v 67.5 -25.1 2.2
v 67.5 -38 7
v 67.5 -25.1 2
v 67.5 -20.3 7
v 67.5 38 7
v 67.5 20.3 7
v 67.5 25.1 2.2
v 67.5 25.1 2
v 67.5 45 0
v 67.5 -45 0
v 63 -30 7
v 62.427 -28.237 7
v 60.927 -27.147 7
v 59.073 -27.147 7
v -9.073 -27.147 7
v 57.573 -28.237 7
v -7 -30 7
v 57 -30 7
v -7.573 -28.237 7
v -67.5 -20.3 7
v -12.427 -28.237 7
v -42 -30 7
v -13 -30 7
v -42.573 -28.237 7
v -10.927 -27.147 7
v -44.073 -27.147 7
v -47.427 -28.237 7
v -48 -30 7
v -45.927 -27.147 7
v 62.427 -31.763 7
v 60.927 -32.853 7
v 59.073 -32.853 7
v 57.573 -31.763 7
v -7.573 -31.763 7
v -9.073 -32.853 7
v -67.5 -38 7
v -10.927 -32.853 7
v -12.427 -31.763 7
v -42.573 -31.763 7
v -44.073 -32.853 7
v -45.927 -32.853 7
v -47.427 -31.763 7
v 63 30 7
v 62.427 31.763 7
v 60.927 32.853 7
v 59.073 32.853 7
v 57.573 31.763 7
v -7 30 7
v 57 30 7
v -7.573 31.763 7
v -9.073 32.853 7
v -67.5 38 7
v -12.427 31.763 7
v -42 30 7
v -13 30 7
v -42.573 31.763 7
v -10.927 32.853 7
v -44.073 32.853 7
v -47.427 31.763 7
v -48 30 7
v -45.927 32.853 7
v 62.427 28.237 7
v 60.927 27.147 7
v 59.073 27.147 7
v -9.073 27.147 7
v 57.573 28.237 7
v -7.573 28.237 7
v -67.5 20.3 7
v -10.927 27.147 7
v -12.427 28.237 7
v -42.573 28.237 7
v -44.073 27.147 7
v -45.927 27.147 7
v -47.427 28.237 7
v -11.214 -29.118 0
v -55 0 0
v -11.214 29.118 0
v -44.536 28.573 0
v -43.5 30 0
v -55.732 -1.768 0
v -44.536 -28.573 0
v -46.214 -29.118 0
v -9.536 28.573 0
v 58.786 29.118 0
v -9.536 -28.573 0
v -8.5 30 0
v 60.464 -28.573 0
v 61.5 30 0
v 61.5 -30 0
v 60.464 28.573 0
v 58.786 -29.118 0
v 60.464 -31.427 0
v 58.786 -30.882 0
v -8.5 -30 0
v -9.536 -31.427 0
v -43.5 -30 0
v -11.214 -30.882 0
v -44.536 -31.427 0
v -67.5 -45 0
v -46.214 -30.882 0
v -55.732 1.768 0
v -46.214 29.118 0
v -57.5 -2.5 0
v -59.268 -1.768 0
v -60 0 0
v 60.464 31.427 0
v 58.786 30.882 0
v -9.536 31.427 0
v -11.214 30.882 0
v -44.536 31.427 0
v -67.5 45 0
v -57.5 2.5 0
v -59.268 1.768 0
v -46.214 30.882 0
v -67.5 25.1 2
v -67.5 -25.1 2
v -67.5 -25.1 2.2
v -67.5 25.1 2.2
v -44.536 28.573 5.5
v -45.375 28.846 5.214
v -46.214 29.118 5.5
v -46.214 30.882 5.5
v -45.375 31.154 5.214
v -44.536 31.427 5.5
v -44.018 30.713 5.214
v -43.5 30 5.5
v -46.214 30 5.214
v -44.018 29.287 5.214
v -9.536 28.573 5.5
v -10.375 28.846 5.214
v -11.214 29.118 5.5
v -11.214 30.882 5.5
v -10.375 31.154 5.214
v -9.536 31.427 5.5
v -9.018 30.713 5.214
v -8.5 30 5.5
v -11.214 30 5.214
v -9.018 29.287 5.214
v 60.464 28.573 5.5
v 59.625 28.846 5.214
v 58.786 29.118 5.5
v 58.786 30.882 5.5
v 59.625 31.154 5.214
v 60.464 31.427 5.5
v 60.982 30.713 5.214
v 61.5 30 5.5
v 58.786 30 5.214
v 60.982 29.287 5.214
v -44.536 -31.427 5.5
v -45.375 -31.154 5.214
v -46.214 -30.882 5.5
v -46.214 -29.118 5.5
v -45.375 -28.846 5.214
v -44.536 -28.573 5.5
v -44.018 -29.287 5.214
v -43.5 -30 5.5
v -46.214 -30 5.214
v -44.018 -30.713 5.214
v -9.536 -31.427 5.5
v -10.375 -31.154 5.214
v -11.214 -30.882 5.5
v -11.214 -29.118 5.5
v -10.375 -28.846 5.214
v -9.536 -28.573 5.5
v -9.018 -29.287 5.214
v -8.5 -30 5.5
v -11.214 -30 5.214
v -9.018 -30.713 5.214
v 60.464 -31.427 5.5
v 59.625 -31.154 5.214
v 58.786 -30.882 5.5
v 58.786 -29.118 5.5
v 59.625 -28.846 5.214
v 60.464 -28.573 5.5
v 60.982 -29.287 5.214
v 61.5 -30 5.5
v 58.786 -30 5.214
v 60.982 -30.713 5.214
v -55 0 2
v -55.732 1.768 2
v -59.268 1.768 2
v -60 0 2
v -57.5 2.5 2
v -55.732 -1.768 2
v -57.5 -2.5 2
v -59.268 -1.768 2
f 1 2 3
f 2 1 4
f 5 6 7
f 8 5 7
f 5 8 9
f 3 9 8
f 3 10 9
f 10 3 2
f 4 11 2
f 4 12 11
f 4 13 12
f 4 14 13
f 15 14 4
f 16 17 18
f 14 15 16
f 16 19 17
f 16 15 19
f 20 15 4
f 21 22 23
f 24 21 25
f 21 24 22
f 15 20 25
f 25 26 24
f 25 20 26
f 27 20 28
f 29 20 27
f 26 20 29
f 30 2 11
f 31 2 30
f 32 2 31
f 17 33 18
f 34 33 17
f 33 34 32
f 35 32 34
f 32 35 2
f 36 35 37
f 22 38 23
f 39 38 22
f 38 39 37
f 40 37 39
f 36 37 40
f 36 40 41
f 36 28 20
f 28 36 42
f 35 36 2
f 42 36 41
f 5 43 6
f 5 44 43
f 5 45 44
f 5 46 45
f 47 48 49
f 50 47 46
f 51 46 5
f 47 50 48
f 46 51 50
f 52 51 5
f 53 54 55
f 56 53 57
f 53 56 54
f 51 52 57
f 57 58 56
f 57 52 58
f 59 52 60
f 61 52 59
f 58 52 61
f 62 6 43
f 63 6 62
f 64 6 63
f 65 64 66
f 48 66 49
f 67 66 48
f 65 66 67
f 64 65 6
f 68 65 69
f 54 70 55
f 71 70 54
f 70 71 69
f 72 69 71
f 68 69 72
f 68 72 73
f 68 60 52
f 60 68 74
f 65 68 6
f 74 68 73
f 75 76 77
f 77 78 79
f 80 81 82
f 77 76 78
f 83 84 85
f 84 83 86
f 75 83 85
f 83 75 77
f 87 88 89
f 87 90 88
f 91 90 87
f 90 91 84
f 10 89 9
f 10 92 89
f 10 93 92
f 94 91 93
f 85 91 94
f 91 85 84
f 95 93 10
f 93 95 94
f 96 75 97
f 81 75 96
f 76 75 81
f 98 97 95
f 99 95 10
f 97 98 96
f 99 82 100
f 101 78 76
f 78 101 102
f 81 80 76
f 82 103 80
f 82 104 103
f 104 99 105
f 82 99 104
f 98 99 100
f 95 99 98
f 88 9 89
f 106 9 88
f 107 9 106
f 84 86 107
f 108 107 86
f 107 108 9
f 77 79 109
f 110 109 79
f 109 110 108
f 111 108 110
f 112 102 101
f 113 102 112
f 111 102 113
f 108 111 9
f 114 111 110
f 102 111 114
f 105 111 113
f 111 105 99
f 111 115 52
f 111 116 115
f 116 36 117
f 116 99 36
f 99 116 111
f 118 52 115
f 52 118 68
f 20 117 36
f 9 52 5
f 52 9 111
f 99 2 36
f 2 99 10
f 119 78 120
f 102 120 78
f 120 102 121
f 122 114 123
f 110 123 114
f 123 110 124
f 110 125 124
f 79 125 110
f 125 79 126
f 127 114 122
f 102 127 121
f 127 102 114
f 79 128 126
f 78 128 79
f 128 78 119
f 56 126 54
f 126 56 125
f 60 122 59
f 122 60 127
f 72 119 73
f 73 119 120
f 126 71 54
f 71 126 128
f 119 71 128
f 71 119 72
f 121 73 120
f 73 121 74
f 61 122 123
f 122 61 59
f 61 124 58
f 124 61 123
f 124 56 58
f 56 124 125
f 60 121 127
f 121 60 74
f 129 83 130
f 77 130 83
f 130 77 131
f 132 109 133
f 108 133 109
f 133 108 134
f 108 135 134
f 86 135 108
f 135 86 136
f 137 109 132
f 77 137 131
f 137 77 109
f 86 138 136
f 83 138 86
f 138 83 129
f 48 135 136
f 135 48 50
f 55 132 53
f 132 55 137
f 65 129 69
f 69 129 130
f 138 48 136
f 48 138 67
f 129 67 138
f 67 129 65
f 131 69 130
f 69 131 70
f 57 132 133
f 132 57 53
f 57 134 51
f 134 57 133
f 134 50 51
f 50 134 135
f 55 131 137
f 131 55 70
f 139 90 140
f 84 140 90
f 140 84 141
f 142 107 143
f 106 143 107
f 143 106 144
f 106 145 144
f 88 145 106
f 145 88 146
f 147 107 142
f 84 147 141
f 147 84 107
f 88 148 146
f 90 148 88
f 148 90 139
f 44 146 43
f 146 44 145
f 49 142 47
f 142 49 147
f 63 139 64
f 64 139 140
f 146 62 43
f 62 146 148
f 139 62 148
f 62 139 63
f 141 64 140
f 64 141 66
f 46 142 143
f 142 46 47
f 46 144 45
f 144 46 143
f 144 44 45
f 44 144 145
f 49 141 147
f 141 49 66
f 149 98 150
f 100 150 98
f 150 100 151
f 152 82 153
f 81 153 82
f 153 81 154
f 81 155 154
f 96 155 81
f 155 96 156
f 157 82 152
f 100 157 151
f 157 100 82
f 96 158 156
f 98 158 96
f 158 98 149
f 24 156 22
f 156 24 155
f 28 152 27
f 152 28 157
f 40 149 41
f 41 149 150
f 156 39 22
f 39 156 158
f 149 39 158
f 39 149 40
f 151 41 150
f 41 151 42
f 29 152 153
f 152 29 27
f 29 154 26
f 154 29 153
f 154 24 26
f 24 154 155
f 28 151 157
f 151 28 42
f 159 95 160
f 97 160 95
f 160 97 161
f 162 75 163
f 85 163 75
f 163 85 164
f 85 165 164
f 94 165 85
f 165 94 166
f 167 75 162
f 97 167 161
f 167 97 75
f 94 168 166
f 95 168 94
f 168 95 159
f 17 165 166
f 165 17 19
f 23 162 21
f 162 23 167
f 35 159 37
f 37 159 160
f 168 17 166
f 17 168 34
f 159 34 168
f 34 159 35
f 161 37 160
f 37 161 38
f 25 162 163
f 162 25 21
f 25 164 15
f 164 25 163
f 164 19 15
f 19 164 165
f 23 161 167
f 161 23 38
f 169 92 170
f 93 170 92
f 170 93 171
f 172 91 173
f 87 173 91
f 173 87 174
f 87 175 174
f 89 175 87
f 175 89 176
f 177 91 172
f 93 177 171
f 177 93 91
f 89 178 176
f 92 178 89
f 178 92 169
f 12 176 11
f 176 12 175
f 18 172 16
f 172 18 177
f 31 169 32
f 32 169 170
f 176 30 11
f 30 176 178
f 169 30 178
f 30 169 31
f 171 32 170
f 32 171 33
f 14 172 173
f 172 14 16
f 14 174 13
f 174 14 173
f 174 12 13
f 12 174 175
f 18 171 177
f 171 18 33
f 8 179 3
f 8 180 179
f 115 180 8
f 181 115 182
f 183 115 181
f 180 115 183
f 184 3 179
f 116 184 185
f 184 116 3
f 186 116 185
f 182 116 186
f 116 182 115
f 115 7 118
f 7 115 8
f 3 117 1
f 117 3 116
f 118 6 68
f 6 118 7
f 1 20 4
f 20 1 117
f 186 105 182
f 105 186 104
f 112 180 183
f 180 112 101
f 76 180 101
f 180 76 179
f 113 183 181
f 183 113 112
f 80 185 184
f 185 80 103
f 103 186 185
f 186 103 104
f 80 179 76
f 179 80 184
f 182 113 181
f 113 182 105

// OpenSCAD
// file: config_4x5.scad
/*
This is the base configuration file for the 4x5" format
# we are not using the exact ANSI measures, but slightly rounded measures for slight simplification
*/
vStabilizerTotal_h = 7;

// general tolerance
vTolerance = 0.2;

// sheet film and cassette measurements (roughly based on the ANSI measurements)
vFilmSheet_l = 127;
vFilmSheet_w = 102;
vCassette_l = 160; // A min
vCassette_w = 121; // B max
vCassette_h = 13.2; // C max
vLightTrap_l = 2; // M2
vLightTrap_w = vCassette_w;
vLightTrap_h = 1.5; // M1
vLightTrap_offsetX = 141; // G max
vFilmWindow_l = 121;
vFilmWindow_w = 101;
vFilmWindow_offsetX = 16;
vGroundGlass_offsetZ = 5;

// Graflok
vGraflok_h = 6; // this is not the official measurement, just measured from a camera 

// lens board measures (we are using Wista/Technika-style lensboards)
vLensboard_l = 100;
vLensboard_w = 97;
vLensboard_h = 2;
vLensboard_offsetX = -(vLensboard_l+3)/2; // caution: we have an asymetric offset!
vLensboard_offsetY = -vLensboard_w/2;
vLensboardHole_d = 85;
vLensboardLighttrap_d = 89;
vLensboardLighttrap_h = 1+vTolerance;

// bellows frame measures - the bellows frame design is derived from standardcameras.com
// back frame
vBellowsBackInner_l = 144; //???? check and replace with the measurement from your bellows!
vBellowsBackInner_w = vBellowsBackInner_l;
vBellowsBackOuter_l = vBellowsBackInner_l+1;
vBellowsBackOuter_w = vBellowsBackOuter_l;

vBellowsBackFrameOuter_l = 159;
vBellowsBackFrameOuter_w = vBellowsBackFrameOuter_l;
vBellowsBackFrameOuter_h = 7;
vBellowsBackFrameInner_l = 135;
vBellowsBackFrameInner_w = vBellowsBackFrameInner_l;
vBellowsBackFrameInner_h = 5;

vBellowsBackLightTrapOuter_l = vBellowsBackFrameInner_l+2*2;
vBellowsBackLightTrapOuter_w = vBellowsBackLightTrapOuter_l;
vBellowsBackLightTrap_h = 3;

//vBellowsBackFrameScrewHole_d = 2;
//vBellowsBackFrameScrewHole_h = 10;
vBellowsBackFrameScrewHole_offsetXY = 70;
vBellowsBackFrameScrewHole_offsetZ = vBellowsBackFrameOuter_h/2;

// front frame
vBellowsFrontInner_l = 94; //???? check and replace with the measurement from your bellows!
vBellowsFrontInner_w = vBellowsFrontInner_l;
vBellowsFrontOuter_l = vBellowsFrontInner_l+1;
vBellowsFrontOuter_w = vBellowsFrontOuter_l;

vBellowsFrontFrameOuter_l = 104;
vBellowsFrontFrameOuter_w = vBellowsFrontFrameOuter_l;
vBellowsFrontFrameOuter_h = 7;
vBellowsFrontFrameInner_l = 82;
vBellowsFrontFrameInner_w = vBellowsFrontFrameInner_l;
vBellowsFrontFrameInner_h = 5;

vBellowsFrontLightTrapOuter_l = vBellowsFrontFrameInner_l+2*2;
vBellowsFrontLightTrapOuter_w = vBellowsFrontLightTrapOuter_l;
vBellowsFrontLightTrap_h = 0;

//vBellowsFrontFrameScrewHole_d = 2;
//vBellowsFrontFrameScrewHole_h = 10;
vBellowsFrontFrameScrewHole_offsetXY = 40;
vBellowsFrontFrameScrewHole_offsetZ = vBellowsFrontFrameOuter_h/2;

// body dimensions
vWall_strength = 5;
vBodyOuter_l = 185; // make sure this is at least 4*vWall_strength larger than vBellowsBackFrameOuter_l!
vBodyOuter_w = 170; // make sure this is at least 2*vWall_strength larger than vBellowsBackFrameOuter_l!
vBodyOuter_h = 65;
vBodyEdge_r = vWall_strength;

// we will center our model on the Y axis and on the center of the bellows frame
// at least for the 4x5 version, we have to do an asymetric offset of 2.5mm on the X-axis 
vAsymOffsetX = -2.5;  

// back plate
vBackPlateLength = 160; // we will probably use about the same size as the bellows back frame
vBackPlateStrength = vWall_strength;

// hinges for front lid
vHingeInnerDistance = 100;
vHingeBaseWidth = 20;
vHingeHole = 4;

// lid lock measures
vLidLockBase_d = 8;
vLidLockHole_distance = 70;

// rail dimensions
vLowerRail_w = 90;
vUpperRail_w = vLowerRail_w;

// cutout for stop indents
vStopIndent_l = 4;
vStopIndent_h = 5;
vStopIndentDistance = 25; // shorter than 25 is not necessary
vStopIndent_offsetX = 20; // don't go shorter than 20 if you intend to use a 90mm lens!

// for all dovetails we use a base width of 5mm and a base height of 5mm
// we are applying tolerances to the inner AND outer part of a dovetail, in width and height
vDoveTail_w = 5;
vDoveTail_h = 5;
vDoveTail_tolerance = 0.2;

// front standard carrier / slider
// width is depending on vUpperRail_w
vSliderBase_w = vUpperRail_w + (4*vDoveTail_w);
vSliderBase_l = 40; // make sure to have enough space in the body.


// lever plate 
vLeverPlateBase_w = vUpperRail_w - (8*vDoveTail_w);
vLeverPlateBlock_w = 25;
vLeverPlateBlock_l = vSliderBase_l-(2*vDoveTail_w);

vFrontStandard_h = 126;
vFrontStandardSlot_h = vFrontStandard_h - 30;

// lensboard carrier
vFrontPlate_length = vSliderBase_w+6; // vSliderBase_w is a bit too tight for 4x5", so there we will add 5mm, for 5x7 vSliderBase_w is OK to get a squared lensboard carrier
vFrontPlate_width = vSliderBase_w; //vFrontPlate_length;
vFrontPlate_height = 16;
vEdgeCutCylinder = floor(sqrt(2*pow(vFrontPlate_width,2)))-5;

vTiltDovetailBase_d1 = 30;
vTiltDovetailBase_d2 = vTiltDovetailBase_d1+(2*vDoveTail_w);
vTiltDovetailBaseBlock_d = vTiltDovetailBase_d1+(4*vDoveTail_w);

vTiltDovetail_d1 = vTiltDovetailBase_d1-vTolerance;
vTiltDovetail_d2 = vTiltDovetailBase_d2-vTolerance;
vTiltDovetail_h = vDoveTail_w-vTolerance;

vTiltDovetailCutout_d1 = vTiltDovetailBase_d2+vTolerance;
vTiltDovetailCutout_d2 = vTiltDovetailBase_d1+vTolerance;

vAxisHole_d = 10+vTolerance;
vAxisHole_h = vDoveTail_w+vTolerance;

vTiltLockBolt_d = 12;
vTiltLockBolt_h = 14;
//vTiltLockBoltHole_d = 8;
//vTiltLockBoltHole_h = vTiltLockBolt_h;

vTiltHeight = 50;
vTiltRadius = vFrontPlate_length/2;
vTiltAngleMinus = -7;
vTiltAnglePlus = 7;
vTiltAxis_d = 10-vTolerance;

// focusing rod
vFocusingRod_d = 6;
vFocusingKnob_d = 25;
vFocusingKnob_h = 20;

// stabilizer measures (just the outer measures of our stabilizer block, not the tripod slider)
vStabilizerBase_l = 135;
vStabilizerBase_w = 90;  
vStabilizerBase_h = 7;
vStabilizerDovetailBase_w = 50;
// screw holes for the stabilizer
vLidHoleCount_x = 4;
vLidHoleDist_x = 35;
vLidHoleCount_y = 2;
vLidHoleDist_y = 60;


// screw diameters, length is individually set
vScrew1Hole_d = 3;
vScrew1ThreadHole_d = 2.2;
vScrew2Hole_d = 2;
vScrew2ThreadHole_d = 1.4;


// Dimensions for small heat set insert holes.
// Sized for M2 inserts, 3 mm depth, 3.5 mm max OD
// (may be labelled M2x3.5x3)
vInsertM2Hole_d = 3.2;
vInsertM2MinDepth_h = 4.0;
vInsertM2Size_d = 3.5;
vInsertM2Depth_h = 3.0;

// Dimensions for heat set insert holes.
// Sized for "Voron standard" M3 inserts, 4 mm depth, 5 mm max OD
// (variously labelled M3x4x5 or M3x5x4)
vInsertM3Hole_d = 4.7;
vInsertM3MinDepth_h = 5.0;
vInsertM3Size_d = 5.0;
vInsertM3Depth_h = 4.0;

// Dimensions for large heat set insert holes.
// Sized for M5 inserts, 5 mm depth, 7 mm max OD
// (may be labelled M5x7x5)
vInsertM5Hole_d = 6.7;
vInsertM5MinDepth_h = 6.0;
vInsertM5Size_d = 7.0;
vInsertM5Depth_h = 5.0;


// Handle strap
vHandleStrap_h = 2.0;       // Thickness of the strap in mm
vHandleStrap_w = 15.0;      // Width of the strap in mm
vHandleStrap_l = 145.0;     // Total length of the strap in mm
vHandleStrapMovement_l = 35.0;   // Total amount the strap moves, in mm. Each side moves half this amount.
vHandleStrapCutout_w = 4.0;      // Width of the central cutout, in mm
vHandleStrapSlotOffsetFar = vHandleStrap_l/2 - vHandleStrap_w/2;
vHandleStrapSlotOffsetNear = vHandleStrapSlotOffsetFar - vHandleStrapMovement_l/2;
vHandleStrapCoverExtra_l = 5.0;
vHandleStrapHoleSize_d = 3.0;
vStrapHoleDelta = vHandleStrapSlotOffsetNear-vHandleStrapCoverExtra_l+vHandleStrapHoleSize_d/2;
vStrapHoleSpacing = vHandleStrapMovement_l/2 + vHandleStrap_w/2;
// file: modules.scad
/*
This is a collection of the modules which are used heavily within the whole project.
Almost all parts rely on the modules to remain "as is", especially regarding their current orientation.
So please act very carefully here, otherwise you may screw up the complete design!

*/
include <baseconfig.scad>;


// roof module - this is heavily used for dovetail cutouts
// please keep as is
module roof(l, w, h){
    polyhedron(
        points=[
            [0,0,0],
            [l,0,0],
            [l,w,0],
            [0,w,0],
            [0,w/2,h],
            [l,w/2,h]
            ],
        faces=[
            [0,1,2,3],
            [0,4,1],
            [1,4,5,2],
            [2,5,3],
            [3,5,4,0]
            ]
            );
    };

// a wedge module - this is heavily used for cutting edges
// please keep as is    
module wedge(l, w, h) {
    polyhedron(
            points=[
                [0,0,0],
                [l,0,0],
                [l,w,0],
                [0,w,0],
                [0,0,h],
                [l,0,h]
            ],
            faces=[
                [0,3,2,1],
                [0,1,5,4],
                [1,2,5],
                [2,3,4,5],
                [3,0,4]
            ]
    );
   };

// simple tube module.   
module tube(d1, d2, h) {
    difference() {
        cylinder(d=d1, h=h);
        cylinder(d=d2, h=h);
        };
    };

// mainly used for making holes for countersunk screws
// please keep as is    
module countersunk_screw(vScrew_d, vScrew_l){
    union(){
    cylinder(d=vScrew_d, h=vScrew_l);
    cylinder(d1=vScrew_d*2, d2=0, h=vScrew_d);
    };
};

// module for making hexagons, e.g. hex nuts. kw is the key width
// please keep as is
module hex(kw, h) {
	render()
        translate([0, 0, h/2])
            intersection_for(a = [0, 120, 240]) {
                rotate([0, 0, a])
                    cube([kw, 3 * kw, h], true);
                }
}


// Heatset insert
// d: Thread diameter
// od: Outer diameter
// l: Total length
module insert(d, od, l)
{
    echo(Insert = d, od, l);
    difference() {
        cylinder(l, d=od, $fn=15);
        translate([0, 0, -0.5]) cylinder(l+1, d=d, $fn=15);
        };
}

module insert_m2()
{
    color("gold") insert(2, vInsertM2Size_d, vInsertM2Depth_h);
}

module insert_m3()
{
    color("gold") insert(3, vInsertM3Size_d, vInsertM3Depth_h);
}

module insert_m5()
{
    color("gold") insert(5, vInsertM5Size_d, vInsertM5Depth_h);
}

// Countersunk screw, metric, for display
// Example: https://www.aliexpress.com/item/1005007838338973.html
module screw_cs(l, d=3, dk=6, s=2, t=1) {
    // l: total length (including head) in mm
    // d: thread diameter (eg 3 for M3)
    // dk: max head diameter
    // s: hex socket flat-to-flat size
    // t: hex socket depth
    echo(CountersunkScrew = d, l);
    difference() {
        union() {
            cylinder(h=l, r=d/2, $fn=15);
            cylinder(h=(dk-d)/2, r1=dk/2, r2=d/2, $fn=15);
            }
        cylinder(h=t, r=s/2*2/sqrt(3), $fn=6);
    }
}

module screw_m3_cs(l) {
    color("silver") screw_cs(l, d=3, dk=6, s=2, t=1);
}

module screw_m2_cs(l) {
    color("silver") screw_cs(l, d=2, dk=3.8, s=1.5, t=0.75);
}
module screw_m5_cs(l) {
    color("silver") screw_cs(l, d=5, dk=9.5, s=3, t=1.6);
}

// Button head screw, metric, for display
// Example: https://www.aliexpress.com/item/32967225441.html
module screw_bh(l, d=3, k=1.5, dk=5.5, s=2, t=1) {
    // l: shaft length (NOT including head) in mm
    // d: thread diameter (eg 3 for M3)
    // k: head depth
    // dk: head max diameter
    // s: hex socket flat-to-flat size
    // t: hex socket depth
    echo(ButtonheadScrew = d, l);
    difference() {
        union() {
            translate([0, 0, k]) cylinder(h=l, r=d/2, $fn=15);
            difference() {
                translate([0, 0, k]) intersection() {
                    sphere(d=dk, $fn=15);
                    translate([-dk/2, -dk/2, -dk]) cube(dk);
                }
                translate([-dk/2, -dk/2, -dk]) cube(dk);
            }
        }
        cylinder(h=t, r=s/2*2/sqrt(3), $fn=6);
    }
}

module screw_m2_bh(l) {
    color("silver") screw_bh(l, d=2, dk=3.4, s=1.175, t=0.6);
}

module screw_m3_bh(l) {
    color("silver") screw_bh(l, d=3, dk=5.7, s=2, t=1);
}


module nut_m5() {
    echo(Nut = 5);
    difference() {
        rotate([0, 0, 30]) cylinder(h=3.9, d=8*2/sqrt(3), $fn=6);
        cylinder(h=5, d=5, $fn=15);
        }
    }
    
    
module thumbscrew(bolt_d, bolt_dk, screw_d, screw_h, n_knurls, knurl_d, knurl_f) {
    // bolt_d:  central bolt diameter
    // bolt_dk: bolt head max diameter
    // screw_d: thumbscrew outer diameter
    // screw_h: thumbscrew height
    // n_knurls: number of knurls
    
    min_knurl_offset = screw_d/2 - knurl_d;
    max_knurl_offset = screw_d/2 + knurl_d;
    knurl_offset = min_knurl_offset + knurl_f*(max_knurl_offset - min_knurl_offset);
    
    difference()
    {
        union()
        {
            translate([0, 0, 1]) cylinder(screw_h-2, d=screw_d);
            cylinder(1, d1=screw_d-1, d2=screw_d);
            translate([0, 0, screw_h-1]) cylinder(1, d1=screw_d, d2=screw_d-1);
        }
        cylinder(screw_h, d=bolt_d);
        cylinder(bolt_dk/2, d1=bolt_dk, d2=0);
        for (i = [1:n_knurls])
        {
            rotate([0, 0, i*360/(n_knurls)]) translate([knurl_offset, 0, 0]) cylinder(screw_h, d=knurl_d);
        }
    }
}

module thumbscrew_m5(screw_d, screw_h, n_knurls, knurl_d, knurl_f) {
    thumbscrew(5, 9.5, screw_d, screw_h, n_knurls, knurl_d, knurl_f);
}


module t6_flange_coupler() {
    // T6 flange coupler
    // Example: https://www.aliexpress.com/item/1005008049363389.html
    echo(FlangeCoupler = 6);
    difference() {
        union() {
            translate([0, 0, 2]) cylinder(h=10, d=10);
            cylinder(h=2, d=22);
        }
        cylinder(h=12, d=6);
        translate([0, 15, 7]) rotate([90, 0, 0]) cylinder(h=30, d=3);
        for (i = [0:3]) {
            rotate([0, 0, 45+90*i]) translate([-8, 0, 0]) cylinder(h=2, d=3);
        }
    }
}


module AXK0619_thrust_bearing() {
    echo(ThrustBearing = "AXK0619");
    difference() {
        cylinder(h=4, d=19);
        cylinder(h=4, d=6);
    }
}


module t6_lead_screw(l) {
    echo(LeadScrewT6 = l);
    color("silver") cylinder(h=l, d=6);
}

module t6_lead_screw_nut() {
    echo("LeadScrewT6Nut");
    intersection()
    {
        difference() {
            union() {
                cylinder(h=15, d=12);
                translate([0, 0, 1.5]) cylinder(h=3.5, d=24);
            }
            cylinder(h=15, d=6);
        }  
        translate([-50, -12.5/2, -50]) cube([100, 12.5, 100]);
    }
}

module threaded_rod_m5(l) {
    echo(ThreadedRodM5 = l);
    color("silver") cylinder(h=l, d=5);
}

module smooth_rod_m4(l) {
    echo(SmoothRodM4 = l);
    color("silver") cylinder(h=l, d=4);
}


module screw_m3_grub(l) {
    echo(GrubScrew = 3, l);
    color("silver") cylinder(h=l, d=3, $fn=15);
}


module screw_m5_grub(l) {
    echo(GrubScrew = 5, l);
    color("silver") cylinder(h=l, d=5, $fn=15);
}


module washer_m6() {
    // M6x12x0.8 washer
    echo(Washer = 6, 0.8);
    difference() {
        cylinder(h=0.8, d=12);
        cylinder(h=0.8, d=6.6);
    }
}


module springwasher_m6() {
    // M6x12x1.5 washer (compresses to 0.5)
    // Show as compressed (~0.5 mm height)
    echo(SpringWasher = 6);
    difference() {
        cylinder(h=0.5, d=12);
        cylinder(h=0.6, d=6);
    }
}


module chamfer_cylinder(h, d, c=0) {
    if (h >= c) {
        cylinder(h=h-c, d=d);
        translate([0, 0, h-c]) cylinder(h=c, d1=d, d2=d-c);
    } else {
        cylinder(h=h, d=d);
    }
}

module chamfer_cube(w, d, h, c=0) {
    if (h >= c) {
        difference() {
            cube([w, d, h]);
            translate([-c, 0, h]) rotate([0, 45, 0]) cube([sqrt(2)*c, d, sqrt(2)*c]);
            translate([w-c, 0, h]) rotate([0, 45, 0]) cube([sqrt(2)*c, d, sqrt(2)*c]);
            translate([0, 0, h-c]) rotate([45, 0, 0]) cube([w, sqrt(2)*c, sqrt(2)*c]);
            translate([0, d, h-c]) rotate([45, 0, 0]) cube([w, sqrt(2)*c, sqrt(2)*c]);
        }
    } else {
        cube(wdh);
    }
}

module rounded_rect(l, w, h) {
    union()
    {
        translate([-l/2+w/2, 0, 0]) cylinder(h=h, d=w);
        translate([l/2-w/2, 0, 0]) cylinder(h=h, d=w);
        translate([-(l-w)/2, -w/2, 0]) cube([l-w, w, h]);
    }
}
// file: baseconfig.scad
/*
Here we define some variables which are independent from the camera format
*/


// some generic variables

// we are including a format specific configuration sheet - but make sure to include only one!

include <config_4x5.scad>;
// include <config_5x7.scad>;
// include <config_8x10.scad>;

// Arca Swiss tripod plate
// caution: some Arca Swiss compatible tripod heads may have slight variations
// vArca_length = xx; // the length is irrelevant here
vArca_width = 38;
vArca_height = 7;
vArcaBase_cutout = 4;
vArcaBase_height = 1.5;
// main file
// loading the base configuration
include <baseconfig.scad>;

// some modules such as hex, countersunk screws, roof, wedge are available in a module file
use <modules.scad>;

module front_lid_dovetail() {

vStabilizer_offsetX = -vStabilizerBase_l/2;
vStabilizer_offsetY = -vStabilizerBase_w/2;
vStabilizer_offsetZ = 0;

// Screwholes for the stabilizing lid
vLidHole_d = vScrew1Hole_d;
vLidHole_h = vStabilizerTotal_h+1;

vLidHoleRow_length = (vLidHoleCount_x-1)*vLidHoleDist_x;
vLidHoleRow_offsetX = -vLidHoleRow_length/2;
vLidHoleRow_offsetY = vLidHoleDist_y/2;
vLidHoleRow_offsetZ = vStabilizerTotal_h; 

vDovetail_length = vStabilizerBase_l;
vDovetailOuter_width = vStabilizerDovetailBase_w+vDoveTail_tolerance;
vDovetailInner_width = vDovetailOuter_width-(2*vDoveTail_w);
vDovetail_offsetX = vStabilizer_offsetX;
vDovetail_offsetY = -vDovetailOuter_width/2;
vDovetail_offsetZ = vStabilizerBase_h-5;

vLockingHole_d = 5;
vLockingHole_h = vStabilizerTotal_h;
vLockingHole_offsetX = vStabilizer_offsetX+10;
vLockingHole_offsetY = 0;
vLockingHole_offsetZ = 0;


difference(){
    intersection(){
        translate([vStabilizer_offsetX, vStabilizer_offsetY, vStabilizer_offsetZ])
            cube([vStabilizerBase_l, vStabilizerBase_w, vStabilizerTotal_h]);
        translate([vStabilizer_offsetX, vStabilizer_offsetY, vStabilizer_offsetZ])
            roof(vStabilizerBase_l, vStabilizerBase_w, vStabilizerBase_w/2 );
    };
    
    // a little bit of height tolerance for the dove tail
    translate([vDovetail_offsetX, vDovetail_offsetY, vDovetail_offsetZ])
        cube([vDovetail_length, vDovetailOuter_width, vDoveTail_tolerance]);
    
    // the dovetail itself
    translate([vDovetail_offsetX, vDovetail_offsetY, vDovetail_offsetZ+vDoveTail_tolerance])
        roof(vDovetail_length, vDovetailOuter_width, vDovetailOuter_width/2);
    
    // Holes for screwing the stabilizer lid
    // Suppress holes for i = 2 as these impinge on the lens indent (see front_lid.scad)
    translate([vLidHoleRow_offsetX, vLidHoleRow_offsetY, vLidHoleRow_offsetZ])
        mirror([0,0,1])
        for (i = [0:vLidHoleCount_x-1]){ 
            if (i != 2) {
            translate([7.5+i*vLidHoleDist_x, 0, 0])
            countersunk_screw(vLidHole_d, vLidHole_h); }
        };
    
    translate([vLidHoleRow_offsetX, -vLidHoleRow_offsetY, vLidHoleRow_offsetZ])
        mirror([0,0,1])
        for (i = [0:vLidHoleCount_x-1]){ 
            if (i != 2) {
            translate([7.5+i*vLidHoleDist_x, 0, 0])
            countersunk_screw(vLidHole_d, vLidHole_h); }
        };
    
    // Hole for Locking Screw
    translate([vLockingHole_offsetX, vLockingHole_offsetY, vLockingHole_offsetZ])
        cylinder(d=vLockingHole_d, h=vLockingHole_h);

};



/*
    // Holes for screwing the stabilizer lid
    
    translate([vLidHoleRow_offsetX, vLidHoleRow_offsetY, vLidHoleRow_offsetZ])
    for (i = [0:vLidHoleCount_x-1]){ 
        translate([i*vLidHoleDist_x, 0, 0])
        cylinder(d=vLidHole_d, h=vLidHole_h);
    };
    
    translate([vLidHoleRow_offsetX, -vLidHoleRow_offsetY, vLidHoleRow_offsetZ])
    for (i = [0:vLidHoleCount_x-1]){ 
        translate([i*vLidHoleDist_x, 0, 0])
        cylinder(d=vLidHole_d, h=vLidHole_h);
    };
    
*/

};

front_lid_dovetail();
